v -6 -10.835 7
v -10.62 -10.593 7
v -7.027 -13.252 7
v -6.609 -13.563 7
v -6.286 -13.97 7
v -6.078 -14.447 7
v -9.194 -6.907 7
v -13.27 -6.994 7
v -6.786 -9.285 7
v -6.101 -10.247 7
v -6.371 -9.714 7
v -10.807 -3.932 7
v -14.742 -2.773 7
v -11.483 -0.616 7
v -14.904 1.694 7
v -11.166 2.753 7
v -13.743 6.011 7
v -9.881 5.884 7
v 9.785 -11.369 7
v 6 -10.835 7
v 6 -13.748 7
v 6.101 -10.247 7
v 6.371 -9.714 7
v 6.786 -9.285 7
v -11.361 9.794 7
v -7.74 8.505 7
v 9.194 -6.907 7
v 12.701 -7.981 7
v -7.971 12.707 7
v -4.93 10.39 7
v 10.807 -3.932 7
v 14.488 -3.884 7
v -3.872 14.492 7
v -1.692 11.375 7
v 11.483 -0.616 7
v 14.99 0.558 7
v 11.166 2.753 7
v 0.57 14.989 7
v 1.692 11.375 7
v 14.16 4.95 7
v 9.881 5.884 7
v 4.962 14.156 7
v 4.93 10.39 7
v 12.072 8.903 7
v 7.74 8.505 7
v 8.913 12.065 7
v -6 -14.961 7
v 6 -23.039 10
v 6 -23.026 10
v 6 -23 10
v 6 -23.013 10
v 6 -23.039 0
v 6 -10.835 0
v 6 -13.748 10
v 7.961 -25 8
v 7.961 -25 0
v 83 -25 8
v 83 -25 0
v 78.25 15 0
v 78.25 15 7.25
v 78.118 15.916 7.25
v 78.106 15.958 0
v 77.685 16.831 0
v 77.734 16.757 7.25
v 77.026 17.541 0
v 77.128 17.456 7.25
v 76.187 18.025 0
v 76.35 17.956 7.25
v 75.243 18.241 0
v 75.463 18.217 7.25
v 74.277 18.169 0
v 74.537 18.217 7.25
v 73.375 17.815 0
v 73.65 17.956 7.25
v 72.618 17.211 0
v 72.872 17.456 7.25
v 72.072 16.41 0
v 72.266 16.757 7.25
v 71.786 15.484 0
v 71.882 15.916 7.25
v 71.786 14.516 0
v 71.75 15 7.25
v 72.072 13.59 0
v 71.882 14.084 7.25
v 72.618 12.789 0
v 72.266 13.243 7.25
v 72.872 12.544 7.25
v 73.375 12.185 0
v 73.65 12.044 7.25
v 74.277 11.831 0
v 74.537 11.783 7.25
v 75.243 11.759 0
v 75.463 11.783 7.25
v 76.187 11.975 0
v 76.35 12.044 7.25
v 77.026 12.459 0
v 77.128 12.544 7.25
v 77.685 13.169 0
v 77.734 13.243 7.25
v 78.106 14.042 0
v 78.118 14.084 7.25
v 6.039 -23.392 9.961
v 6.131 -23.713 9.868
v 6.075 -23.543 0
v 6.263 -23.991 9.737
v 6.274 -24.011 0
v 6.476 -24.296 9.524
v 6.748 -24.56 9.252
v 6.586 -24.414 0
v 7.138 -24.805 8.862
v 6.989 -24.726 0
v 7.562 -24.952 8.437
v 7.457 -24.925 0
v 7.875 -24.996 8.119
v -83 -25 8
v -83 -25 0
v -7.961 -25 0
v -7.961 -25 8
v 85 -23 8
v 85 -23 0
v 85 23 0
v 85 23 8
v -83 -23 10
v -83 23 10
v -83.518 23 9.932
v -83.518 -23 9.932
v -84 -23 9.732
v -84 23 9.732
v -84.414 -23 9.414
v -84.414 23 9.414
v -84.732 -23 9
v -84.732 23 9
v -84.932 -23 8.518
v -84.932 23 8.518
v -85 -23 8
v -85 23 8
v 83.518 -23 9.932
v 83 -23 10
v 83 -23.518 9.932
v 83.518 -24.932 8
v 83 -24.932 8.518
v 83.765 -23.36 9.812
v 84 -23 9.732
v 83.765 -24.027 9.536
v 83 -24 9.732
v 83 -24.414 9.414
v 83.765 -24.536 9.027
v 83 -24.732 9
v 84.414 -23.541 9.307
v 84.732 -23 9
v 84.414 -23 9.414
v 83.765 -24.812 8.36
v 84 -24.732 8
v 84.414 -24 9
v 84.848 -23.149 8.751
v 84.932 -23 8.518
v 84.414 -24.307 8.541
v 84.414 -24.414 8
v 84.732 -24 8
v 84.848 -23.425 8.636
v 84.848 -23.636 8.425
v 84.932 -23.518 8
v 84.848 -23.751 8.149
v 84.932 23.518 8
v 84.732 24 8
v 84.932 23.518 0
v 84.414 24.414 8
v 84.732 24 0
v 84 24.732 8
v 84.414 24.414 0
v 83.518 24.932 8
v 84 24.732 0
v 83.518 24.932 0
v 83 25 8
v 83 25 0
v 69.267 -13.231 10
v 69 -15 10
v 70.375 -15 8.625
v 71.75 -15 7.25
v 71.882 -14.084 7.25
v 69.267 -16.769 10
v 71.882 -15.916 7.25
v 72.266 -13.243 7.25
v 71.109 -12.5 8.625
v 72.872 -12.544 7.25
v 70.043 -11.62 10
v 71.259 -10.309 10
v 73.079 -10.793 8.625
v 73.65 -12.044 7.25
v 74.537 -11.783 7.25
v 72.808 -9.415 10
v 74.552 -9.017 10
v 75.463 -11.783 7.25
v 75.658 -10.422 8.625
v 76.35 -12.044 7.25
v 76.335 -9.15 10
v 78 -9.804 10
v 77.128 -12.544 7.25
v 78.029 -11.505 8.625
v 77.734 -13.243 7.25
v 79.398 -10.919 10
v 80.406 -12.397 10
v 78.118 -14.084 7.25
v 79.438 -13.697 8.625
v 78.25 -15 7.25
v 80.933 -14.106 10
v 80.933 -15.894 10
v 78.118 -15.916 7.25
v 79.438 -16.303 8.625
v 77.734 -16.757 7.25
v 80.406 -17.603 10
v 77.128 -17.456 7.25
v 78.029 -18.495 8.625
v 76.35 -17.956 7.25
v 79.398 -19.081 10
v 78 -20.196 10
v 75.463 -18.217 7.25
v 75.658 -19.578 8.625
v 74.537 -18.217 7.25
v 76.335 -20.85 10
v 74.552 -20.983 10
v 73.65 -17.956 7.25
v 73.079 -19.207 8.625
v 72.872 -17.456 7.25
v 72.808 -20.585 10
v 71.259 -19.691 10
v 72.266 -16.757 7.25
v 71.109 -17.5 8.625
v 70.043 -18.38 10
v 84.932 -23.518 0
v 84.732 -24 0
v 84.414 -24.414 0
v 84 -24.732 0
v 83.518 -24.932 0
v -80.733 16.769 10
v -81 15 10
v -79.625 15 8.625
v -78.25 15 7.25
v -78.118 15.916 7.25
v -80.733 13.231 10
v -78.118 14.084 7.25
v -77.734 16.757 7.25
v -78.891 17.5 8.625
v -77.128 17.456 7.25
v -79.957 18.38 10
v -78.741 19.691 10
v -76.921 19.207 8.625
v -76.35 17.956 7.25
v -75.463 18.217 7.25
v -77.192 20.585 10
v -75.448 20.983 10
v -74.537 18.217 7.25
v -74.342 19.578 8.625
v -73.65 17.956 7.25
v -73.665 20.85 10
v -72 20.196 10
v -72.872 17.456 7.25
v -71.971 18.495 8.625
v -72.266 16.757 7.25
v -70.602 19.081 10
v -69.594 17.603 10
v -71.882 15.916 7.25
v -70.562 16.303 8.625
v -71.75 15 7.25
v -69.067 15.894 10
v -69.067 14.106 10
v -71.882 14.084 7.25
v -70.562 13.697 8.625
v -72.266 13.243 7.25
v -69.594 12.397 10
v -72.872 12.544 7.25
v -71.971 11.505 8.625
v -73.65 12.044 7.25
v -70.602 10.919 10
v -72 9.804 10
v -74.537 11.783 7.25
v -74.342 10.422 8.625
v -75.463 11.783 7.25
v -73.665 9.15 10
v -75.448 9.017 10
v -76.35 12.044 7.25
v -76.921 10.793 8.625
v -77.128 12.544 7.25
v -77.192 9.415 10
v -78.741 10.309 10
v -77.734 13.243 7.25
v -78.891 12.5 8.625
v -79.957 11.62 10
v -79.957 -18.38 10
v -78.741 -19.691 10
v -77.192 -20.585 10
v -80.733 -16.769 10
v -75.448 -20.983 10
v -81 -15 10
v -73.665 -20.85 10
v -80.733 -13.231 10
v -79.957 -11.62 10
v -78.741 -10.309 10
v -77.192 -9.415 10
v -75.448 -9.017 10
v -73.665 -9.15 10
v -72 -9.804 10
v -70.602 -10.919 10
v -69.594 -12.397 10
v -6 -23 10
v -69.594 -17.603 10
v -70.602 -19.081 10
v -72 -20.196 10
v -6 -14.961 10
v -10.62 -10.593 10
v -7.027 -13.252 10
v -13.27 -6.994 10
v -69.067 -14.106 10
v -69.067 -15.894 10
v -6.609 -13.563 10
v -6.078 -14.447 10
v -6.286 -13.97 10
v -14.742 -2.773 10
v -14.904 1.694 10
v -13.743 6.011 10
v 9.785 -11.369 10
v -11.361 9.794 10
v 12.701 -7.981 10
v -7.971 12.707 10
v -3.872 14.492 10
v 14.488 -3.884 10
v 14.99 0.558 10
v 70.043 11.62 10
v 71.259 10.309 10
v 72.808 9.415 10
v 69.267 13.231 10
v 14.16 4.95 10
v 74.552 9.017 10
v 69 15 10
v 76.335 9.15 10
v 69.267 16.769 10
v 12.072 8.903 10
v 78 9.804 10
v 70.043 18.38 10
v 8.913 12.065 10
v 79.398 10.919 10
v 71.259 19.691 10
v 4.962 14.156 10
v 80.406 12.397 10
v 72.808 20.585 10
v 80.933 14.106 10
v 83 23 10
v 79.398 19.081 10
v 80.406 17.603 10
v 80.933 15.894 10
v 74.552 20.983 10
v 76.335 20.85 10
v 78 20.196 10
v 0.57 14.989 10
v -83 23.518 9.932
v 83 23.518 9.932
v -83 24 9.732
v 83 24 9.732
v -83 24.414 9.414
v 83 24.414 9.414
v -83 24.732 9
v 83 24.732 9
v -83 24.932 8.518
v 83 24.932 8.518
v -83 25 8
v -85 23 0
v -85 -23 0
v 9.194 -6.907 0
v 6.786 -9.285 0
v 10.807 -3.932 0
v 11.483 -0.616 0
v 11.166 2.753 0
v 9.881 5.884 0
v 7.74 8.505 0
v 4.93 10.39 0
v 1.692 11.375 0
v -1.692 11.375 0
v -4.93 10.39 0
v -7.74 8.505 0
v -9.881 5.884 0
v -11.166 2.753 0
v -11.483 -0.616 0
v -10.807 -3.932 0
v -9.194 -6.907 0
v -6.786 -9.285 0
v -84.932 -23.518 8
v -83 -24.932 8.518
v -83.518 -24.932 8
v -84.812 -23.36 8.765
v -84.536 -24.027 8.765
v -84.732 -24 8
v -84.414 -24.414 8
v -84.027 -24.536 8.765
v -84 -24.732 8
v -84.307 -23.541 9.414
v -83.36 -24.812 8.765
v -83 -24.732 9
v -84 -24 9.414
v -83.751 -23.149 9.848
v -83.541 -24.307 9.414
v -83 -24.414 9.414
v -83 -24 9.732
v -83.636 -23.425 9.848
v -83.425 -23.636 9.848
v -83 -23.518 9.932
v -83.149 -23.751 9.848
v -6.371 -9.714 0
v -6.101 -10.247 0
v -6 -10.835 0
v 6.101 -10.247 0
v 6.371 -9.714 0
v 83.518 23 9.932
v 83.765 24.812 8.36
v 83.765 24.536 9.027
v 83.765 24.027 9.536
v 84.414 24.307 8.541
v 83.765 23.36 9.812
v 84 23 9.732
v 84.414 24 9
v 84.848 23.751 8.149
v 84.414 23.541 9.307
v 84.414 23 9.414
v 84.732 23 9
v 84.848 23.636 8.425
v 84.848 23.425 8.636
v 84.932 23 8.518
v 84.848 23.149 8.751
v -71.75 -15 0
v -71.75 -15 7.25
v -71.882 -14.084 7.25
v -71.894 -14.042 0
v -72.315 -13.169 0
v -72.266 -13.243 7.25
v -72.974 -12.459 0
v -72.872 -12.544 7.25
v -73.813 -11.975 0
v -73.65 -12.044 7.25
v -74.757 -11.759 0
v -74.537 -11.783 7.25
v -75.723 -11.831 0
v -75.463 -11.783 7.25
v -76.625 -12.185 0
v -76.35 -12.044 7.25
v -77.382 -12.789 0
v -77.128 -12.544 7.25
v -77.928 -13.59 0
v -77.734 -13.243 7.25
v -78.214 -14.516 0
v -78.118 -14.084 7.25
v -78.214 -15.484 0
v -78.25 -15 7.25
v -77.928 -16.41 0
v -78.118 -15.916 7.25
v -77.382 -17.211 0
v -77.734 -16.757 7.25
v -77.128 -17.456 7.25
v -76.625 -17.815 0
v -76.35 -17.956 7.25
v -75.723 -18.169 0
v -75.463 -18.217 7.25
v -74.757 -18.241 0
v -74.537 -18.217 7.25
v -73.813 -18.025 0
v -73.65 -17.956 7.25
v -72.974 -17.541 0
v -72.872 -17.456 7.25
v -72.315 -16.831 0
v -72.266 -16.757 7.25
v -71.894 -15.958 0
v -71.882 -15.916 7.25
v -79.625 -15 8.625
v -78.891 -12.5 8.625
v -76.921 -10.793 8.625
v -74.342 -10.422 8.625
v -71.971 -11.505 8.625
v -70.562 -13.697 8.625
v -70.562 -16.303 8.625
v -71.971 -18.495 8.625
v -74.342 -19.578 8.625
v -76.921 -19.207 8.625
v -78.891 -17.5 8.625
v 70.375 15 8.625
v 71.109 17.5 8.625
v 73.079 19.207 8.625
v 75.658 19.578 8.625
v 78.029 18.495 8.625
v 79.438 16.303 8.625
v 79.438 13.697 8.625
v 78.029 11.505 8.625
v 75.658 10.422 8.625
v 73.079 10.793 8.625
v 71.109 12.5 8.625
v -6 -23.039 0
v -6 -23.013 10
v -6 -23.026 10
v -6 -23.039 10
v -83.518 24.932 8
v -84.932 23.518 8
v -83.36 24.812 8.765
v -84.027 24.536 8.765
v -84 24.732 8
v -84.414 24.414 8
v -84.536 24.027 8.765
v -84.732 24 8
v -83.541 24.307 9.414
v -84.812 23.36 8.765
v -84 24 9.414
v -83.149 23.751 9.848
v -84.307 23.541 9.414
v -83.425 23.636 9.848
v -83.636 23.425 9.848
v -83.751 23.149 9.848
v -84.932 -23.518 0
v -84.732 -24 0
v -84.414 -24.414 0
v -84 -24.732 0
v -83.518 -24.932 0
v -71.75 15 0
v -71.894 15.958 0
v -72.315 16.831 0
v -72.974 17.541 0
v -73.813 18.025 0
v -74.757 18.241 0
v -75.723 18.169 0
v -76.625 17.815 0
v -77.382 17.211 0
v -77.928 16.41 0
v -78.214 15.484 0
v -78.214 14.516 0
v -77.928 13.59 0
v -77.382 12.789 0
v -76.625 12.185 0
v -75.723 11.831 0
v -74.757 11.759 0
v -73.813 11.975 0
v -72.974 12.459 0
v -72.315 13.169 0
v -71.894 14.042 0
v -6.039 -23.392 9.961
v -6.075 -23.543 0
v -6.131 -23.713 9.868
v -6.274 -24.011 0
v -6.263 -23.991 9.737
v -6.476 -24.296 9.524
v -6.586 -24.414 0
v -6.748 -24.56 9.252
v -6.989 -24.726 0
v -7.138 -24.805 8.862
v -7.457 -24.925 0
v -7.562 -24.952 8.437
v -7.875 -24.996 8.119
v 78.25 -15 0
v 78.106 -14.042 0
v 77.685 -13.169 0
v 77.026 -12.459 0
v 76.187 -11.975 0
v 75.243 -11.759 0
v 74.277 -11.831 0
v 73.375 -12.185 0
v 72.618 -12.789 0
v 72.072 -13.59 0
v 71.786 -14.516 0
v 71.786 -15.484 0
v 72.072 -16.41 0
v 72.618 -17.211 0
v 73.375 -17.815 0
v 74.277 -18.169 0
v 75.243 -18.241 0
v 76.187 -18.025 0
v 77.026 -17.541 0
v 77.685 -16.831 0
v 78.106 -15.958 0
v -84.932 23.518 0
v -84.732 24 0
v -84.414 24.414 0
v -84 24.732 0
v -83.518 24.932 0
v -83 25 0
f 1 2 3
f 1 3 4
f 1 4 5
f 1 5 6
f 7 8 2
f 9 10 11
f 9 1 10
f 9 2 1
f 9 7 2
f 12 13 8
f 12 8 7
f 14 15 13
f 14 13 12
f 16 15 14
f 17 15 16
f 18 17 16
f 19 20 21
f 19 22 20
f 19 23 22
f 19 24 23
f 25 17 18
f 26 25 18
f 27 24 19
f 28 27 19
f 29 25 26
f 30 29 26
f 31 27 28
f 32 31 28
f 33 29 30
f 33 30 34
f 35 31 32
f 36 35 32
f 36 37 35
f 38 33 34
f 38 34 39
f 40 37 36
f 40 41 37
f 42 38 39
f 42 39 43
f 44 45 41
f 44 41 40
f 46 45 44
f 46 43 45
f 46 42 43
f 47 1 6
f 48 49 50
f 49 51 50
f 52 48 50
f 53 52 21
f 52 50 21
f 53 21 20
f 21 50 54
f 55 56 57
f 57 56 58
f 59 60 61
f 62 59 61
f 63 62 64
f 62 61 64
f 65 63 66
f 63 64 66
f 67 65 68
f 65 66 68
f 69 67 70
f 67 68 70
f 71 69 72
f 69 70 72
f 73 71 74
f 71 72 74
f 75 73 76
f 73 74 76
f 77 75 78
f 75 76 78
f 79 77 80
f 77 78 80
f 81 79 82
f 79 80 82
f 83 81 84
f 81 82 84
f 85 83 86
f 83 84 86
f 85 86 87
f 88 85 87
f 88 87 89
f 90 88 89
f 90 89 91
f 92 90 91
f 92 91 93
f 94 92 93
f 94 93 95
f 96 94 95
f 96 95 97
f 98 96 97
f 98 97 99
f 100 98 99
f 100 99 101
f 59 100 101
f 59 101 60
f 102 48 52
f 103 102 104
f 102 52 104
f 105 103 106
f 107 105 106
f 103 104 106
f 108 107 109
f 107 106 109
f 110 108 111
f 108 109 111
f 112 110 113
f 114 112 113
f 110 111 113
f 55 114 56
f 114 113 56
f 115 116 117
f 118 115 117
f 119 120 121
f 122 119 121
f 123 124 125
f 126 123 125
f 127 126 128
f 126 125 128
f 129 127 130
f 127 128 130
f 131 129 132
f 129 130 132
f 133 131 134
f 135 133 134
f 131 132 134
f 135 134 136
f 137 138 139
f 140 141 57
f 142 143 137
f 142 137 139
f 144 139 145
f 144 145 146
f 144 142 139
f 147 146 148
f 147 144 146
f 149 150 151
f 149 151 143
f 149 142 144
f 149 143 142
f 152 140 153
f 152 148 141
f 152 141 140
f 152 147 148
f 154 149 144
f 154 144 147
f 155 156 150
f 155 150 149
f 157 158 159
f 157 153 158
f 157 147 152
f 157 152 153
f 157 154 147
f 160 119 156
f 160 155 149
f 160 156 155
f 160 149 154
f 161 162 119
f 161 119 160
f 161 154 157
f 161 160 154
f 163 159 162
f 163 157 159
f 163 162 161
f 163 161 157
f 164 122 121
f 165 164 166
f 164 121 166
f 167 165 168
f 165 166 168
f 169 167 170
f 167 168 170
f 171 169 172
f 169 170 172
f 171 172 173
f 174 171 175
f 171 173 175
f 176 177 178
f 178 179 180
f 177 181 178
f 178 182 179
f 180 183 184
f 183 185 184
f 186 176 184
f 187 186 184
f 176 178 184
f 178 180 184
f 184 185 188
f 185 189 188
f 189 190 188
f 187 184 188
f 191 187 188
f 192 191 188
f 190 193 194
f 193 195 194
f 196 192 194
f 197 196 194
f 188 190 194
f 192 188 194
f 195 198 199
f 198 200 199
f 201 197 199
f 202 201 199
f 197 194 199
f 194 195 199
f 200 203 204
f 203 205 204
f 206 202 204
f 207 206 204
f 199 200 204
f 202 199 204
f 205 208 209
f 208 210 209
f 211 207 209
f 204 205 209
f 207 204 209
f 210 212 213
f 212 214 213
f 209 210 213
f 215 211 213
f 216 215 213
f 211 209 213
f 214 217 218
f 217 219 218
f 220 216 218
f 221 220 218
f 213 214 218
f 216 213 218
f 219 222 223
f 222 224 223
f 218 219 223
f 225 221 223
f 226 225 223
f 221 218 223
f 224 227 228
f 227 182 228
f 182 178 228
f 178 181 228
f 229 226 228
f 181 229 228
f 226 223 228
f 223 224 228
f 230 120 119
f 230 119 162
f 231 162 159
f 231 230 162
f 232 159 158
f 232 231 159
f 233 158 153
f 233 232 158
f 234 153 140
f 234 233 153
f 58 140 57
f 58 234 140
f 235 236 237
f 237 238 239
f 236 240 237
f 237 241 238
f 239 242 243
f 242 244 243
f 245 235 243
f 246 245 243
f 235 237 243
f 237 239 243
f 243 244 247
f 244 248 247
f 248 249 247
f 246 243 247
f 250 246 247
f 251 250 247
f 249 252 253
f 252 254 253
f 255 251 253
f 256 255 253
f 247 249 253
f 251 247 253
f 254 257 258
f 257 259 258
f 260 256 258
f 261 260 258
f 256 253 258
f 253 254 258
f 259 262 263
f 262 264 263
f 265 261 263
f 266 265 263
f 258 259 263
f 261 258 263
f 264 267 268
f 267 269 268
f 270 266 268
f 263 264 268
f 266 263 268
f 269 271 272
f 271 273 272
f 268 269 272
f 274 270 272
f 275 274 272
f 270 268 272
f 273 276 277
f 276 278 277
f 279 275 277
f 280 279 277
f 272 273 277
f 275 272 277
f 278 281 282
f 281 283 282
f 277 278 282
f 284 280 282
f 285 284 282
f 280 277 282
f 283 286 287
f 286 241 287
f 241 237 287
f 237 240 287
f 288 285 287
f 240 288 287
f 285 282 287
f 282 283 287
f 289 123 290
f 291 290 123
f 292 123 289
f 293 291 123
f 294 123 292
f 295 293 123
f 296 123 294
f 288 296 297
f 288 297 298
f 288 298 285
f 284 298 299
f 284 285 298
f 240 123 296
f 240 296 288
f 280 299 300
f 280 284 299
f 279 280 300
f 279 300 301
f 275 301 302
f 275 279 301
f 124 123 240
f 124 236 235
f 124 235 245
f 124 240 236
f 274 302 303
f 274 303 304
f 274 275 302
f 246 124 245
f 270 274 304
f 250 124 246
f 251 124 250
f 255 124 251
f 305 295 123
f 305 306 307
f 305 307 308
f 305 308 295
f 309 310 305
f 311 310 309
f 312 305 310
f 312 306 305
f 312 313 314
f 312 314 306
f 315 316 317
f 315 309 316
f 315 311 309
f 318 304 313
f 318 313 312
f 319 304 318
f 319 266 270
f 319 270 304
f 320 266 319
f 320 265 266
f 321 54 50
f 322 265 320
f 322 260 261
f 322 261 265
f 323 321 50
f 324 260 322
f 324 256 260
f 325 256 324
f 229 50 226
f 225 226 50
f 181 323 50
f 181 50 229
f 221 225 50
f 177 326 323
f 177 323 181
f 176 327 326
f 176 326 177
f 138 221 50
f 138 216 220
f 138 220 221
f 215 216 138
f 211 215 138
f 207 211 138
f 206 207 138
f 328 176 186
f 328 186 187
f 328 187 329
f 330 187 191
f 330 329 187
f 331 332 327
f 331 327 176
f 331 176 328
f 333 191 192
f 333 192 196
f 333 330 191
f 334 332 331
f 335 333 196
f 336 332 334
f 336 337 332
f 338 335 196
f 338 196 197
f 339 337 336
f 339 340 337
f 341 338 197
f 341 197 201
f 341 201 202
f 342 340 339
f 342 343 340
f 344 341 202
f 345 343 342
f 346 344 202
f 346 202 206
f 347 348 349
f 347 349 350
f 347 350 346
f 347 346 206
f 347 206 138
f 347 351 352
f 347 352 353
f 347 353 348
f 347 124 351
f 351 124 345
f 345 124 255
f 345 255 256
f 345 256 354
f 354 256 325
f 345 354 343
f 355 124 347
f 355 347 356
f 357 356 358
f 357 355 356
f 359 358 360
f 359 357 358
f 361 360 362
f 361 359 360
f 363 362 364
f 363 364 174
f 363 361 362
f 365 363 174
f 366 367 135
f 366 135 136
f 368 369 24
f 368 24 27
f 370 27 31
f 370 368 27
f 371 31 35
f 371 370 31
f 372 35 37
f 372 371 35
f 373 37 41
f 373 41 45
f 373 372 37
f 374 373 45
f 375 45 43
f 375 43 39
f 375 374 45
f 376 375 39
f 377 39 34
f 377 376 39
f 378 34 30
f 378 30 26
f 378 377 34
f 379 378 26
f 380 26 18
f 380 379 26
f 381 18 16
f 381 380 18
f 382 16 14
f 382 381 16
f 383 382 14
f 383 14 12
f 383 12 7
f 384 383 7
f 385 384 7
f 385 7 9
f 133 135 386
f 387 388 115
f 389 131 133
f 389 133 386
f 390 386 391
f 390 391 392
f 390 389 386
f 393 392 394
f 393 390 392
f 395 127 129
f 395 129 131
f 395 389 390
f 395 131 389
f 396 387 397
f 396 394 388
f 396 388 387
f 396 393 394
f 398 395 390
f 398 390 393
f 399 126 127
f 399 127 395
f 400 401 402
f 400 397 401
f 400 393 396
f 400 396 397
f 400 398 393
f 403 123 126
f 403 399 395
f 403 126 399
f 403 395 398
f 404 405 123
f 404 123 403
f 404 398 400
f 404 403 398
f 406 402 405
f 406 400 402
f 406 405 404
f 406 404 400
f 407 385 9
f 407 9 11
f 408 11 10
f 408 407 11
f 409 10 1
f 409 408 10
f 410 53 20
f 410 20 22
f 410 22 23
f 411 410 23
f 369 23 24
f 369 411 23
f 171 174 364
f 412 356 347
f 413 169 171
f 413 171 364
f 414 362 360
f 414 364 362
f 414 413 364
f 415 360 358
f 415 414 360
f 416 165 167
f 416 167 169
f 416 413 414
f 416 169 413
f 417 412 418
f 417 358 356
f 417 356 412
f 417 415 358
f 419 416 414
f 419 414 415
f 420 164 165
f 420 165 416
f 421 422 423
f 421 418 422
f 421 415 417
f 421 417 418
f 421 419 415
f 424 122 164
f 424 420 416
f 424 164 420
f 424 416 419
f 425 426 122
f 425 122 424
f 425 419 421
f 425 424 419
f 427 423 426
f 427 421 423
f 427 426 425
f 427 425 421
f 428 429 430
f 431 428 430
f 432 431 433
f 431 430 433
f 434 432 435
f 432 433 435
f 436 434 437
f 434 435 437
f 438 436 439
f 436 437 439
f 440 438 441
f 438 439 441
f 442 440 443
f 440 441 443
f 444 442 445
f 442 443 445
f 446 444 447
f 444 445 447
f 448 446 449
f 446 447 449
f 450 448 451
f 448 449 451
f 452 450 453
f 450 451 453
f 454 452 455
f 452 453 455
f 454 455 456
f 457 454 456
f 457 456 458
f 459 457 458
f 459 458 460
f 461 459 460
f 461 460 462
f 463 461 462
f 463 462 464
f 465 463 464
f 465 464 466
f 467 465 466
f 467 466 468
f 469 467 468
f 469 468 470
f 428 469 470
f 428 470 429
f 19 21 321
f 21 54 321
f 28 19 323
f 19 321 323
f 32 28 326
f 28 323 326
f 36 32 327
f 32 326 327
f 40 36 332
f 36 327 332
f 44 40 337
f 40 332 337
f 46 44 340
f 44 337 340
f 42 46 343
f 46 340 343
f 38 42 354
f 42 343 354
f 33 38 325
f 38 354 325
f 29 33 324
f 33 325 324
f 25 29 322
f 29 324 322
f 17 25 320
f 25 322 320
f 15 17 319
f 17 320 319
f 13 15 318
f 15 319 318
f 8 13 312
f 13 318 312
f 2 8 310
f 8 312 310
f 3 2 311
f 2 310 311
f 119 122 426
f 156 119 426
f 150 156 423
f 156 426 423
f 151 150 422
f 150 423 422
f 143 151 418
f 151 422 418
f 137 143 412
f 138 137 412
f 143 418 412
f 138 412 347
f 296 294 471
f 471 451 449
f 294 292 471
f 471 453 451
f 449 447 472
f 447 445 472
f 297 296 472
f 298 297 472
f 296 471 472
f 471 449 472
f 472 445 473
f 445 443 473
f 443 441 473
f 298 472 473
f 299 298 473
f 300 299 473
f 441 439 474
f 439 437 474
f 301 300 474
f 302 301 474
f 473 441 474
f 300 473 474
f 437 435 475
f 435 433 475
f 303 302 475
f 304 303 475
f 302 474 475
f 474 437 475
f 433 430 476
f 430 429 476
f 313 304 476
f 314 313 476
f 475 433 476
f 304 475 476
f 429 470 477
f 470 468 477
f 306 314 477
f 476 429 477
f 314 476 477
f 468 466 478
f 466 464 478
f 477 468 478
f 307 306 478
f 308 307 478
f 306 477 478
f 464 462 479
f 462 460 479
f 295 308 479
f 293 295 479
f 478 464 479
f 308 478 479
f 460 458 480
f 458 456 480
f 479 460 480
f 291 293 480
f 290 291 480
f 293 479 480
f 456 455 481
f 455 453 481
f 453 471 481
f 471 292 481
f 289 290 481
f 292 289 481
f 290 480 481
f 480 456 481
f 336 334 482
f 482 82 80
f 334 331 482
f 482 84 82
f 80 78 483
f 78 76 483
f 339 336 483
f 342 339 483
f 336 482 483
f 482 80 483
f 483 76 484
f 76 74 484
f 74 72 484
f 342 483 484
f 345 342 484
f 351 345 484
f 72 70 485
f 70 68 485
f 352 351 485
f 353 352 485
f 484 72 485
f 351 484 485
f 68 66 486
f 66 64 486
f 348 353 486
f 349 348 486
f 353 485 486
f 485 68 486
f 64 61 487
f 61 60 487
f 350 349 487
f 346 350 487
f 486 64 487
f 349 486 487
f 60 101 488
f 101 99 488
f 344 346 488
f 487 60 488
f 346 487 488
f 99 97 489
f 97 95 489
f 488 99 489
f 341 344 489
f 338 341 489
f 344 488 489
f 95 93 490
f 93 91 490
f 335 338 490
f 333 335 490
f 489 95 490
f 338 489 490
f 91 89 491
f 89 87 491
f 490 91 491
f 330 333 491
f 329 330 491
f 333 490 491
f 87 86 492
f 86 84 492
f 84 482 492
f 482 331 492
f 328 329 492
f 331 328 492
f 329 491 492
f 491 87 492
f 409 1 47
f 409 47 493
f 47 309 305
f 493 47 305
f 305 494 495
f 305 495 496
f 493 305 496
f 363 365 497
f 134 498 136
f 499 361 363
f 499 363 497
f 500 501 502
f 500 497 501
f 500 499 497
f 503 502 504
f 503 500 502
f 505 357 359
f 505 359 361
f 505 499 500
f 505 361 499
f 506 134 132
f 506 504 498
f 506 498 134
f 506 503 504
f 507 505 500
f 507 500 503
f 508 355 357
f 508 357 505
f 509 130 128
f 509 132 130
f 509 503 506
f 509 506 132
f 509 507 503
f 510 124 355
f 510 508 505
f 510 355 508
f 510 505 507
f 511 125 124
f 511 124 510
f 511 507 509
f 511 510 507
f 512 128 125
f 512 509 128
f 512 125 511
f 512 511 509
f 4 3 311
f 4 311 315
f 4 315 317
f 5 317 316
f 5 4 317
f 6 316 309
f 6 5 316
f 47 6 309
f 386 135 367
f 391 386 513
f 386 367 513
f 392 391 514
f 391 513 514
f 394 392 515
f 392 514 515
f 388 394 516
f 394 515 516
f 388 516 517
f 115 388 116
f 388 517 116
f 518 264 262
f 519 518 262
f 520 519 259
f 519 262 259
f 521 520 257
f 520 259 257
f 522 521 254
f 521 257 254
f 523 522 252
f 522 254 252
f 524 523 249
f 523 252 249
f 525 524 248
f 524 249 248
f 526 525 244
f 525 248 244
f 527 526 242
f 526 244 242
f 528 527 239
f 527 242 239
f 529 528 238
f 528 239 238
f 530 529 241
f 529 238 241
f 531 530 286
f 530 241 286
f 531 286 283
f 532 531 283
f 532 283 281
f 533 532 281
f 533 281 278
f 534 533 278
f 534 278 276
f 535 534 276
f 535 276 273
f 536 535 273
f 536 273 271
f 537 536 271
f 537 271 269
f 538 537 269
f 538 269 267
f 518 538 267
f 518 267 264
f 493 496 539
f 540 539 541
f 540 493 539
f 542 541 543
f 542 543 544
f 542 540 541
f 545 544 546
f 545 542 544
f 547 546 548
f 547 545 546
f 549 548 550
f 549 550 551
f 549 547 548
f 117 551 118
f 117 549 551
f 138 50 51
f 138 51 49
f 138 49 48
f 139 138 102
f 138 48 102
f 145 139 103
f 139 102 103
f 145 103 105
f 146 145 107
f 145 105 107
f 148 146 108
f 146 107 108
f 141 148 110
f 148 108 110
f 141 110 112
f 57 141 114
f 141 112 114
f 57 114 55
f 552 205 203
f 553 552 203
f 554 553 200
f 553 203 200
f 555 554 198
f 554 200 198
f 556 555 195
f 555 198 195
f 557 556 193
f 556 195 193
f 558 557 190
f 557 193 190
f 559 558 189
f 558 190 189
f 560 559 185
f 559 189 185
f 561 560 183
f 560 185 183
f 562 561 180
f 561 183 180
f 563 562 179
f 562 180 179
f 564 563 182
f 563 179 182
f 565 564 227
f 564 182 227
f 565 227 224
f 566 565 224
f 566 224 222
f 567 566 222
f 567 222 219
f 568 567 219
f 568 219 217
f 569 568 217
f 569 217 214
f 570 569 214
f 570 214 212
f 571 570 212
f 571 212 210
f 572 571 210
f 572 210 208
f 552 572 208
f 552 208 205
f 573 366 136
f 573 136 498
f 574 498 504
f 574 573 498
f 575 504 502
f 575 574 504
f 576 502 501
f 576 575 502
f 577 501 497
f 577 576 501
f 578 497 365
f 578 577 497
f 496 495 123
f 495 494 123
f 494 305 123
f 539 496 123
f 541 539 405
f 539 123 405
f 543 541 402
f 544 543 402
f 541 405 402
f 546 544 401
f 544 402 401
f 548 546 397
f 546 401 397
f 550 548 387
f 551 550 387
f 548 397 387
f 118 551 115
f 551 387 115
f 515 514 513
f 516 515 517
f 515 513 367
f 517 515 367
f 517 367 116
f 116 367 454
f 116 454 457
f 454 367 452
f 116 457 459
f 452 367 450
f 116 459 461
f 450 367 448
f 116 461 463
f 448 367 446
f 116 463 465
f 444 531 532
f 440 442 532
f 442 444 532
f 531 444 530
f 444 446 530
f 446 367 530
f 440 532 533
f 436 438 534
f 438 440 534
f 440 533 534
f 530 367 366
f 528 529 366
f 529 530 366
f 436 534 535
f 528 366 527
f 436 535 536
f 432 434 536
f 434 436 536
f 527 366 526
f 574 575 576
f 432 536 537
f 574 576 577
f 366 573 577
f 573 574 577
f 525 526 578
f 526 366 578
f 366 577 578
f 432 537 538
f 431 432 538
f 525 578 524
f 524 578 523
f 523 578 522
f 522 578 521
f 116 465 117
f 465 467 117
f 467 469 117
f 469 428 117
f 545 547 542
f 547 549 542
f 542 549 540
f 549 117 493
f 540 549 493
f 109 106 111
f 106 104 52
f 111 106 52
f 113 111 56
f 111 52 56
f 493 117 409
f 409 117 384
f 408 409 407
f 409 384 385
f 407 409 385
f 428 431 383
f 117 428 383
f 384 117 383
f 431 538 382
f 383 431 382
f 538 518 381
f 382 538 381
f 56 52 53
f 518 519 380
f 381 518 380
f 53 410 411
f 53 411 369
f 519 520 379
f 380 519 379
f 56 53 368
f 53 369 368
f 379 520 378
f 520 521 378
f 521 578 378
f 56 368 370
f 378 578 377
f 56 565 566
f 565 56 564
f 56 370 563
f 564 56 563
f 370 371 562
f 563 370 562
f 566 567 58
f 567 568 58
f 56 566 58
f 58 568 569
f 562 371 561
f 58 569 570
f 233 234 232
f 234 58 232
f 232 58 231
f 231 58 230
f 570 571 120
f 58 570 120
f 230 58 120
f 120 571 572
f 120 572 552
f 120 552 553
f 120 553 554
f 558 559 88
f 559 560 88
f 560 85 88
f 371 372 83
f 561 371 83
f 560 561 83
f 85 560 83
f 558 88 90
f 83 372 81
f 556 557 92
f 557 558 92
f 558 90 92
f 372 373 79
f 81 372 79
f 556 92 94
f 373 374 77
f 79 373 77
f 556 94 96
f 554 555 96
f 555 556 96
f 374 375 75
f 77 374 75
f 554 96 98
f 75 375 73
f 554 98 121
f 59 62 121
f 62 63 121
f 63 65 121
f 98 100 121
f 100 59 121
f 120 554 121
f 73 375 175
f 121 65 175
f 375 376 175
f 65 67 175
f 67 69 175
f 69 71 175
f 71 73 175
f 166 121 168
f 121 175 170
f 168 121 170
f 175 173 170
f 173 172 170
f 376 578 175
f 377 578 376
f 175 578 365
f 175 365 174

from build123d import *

# Parameters (mm, degrees)
F0_W            = 170
F0_H            = 50
F0_R            = 11.5
F1_DEPTH        = 10
F2_R            = 3.25
F3_DEPTH        = 10.001
F4_R            = 15
F4_R_2          = 11.5
F5_DEPTH        = 3
F7_DEPTH        = 25
F8_T1_DEPTH     = 20.004828627
F8_T3_DEPTH     = 12.3229236974
F8_T5_DEPTH     = 6.1336823274
F9_T1_DEPTH     = 46
F9_T3_DEPTH     = 166
F9_T5_DEPTH     = 13
F9_T7_DEPTH     = 80.0390459698
F9_T9_DEPTH     = 80.0390459698
F9_S13_W        = 2
F9_S13_H        = 2
F9_T14_DEPTH    = 2
F9_S19_W        = 2
F9_S19_H        = 2
F9_T20_DEPTH    = 2
F9_S25_W        = 2
F9_S25_H        = 2
F9_T26_DEPTH    = 2
F9_S31_W        = 2
F9_S31_H        = 2
F9_T32_DEPTH    = 2
F11_D           = 6.5
F11_DEPTH       = 15
F11_CSINK_D     = 12
F11_CSINK_ANGLE = 90
F11_TIP         = 1.9527970118


# Not quite as in the source:
# - a fillet or chamfer that OpenCascade refuses, or shapes differently, is made with other operations: its cross-section is extruded or revolved along the edge and cut away or added


with BuildPart() as f1:
    # F0 (on Top) → F1 (new body)
    with BuildSketch(Plane.XY):
        Rectangle(F0_W, F0_H)
        Circle(F0_R, mode=Mode.SUBTRACT)
    extrude(amount=F1_DEPTH)

    # F2 (on face) → F3 (cut, through all)
    with BuildSketch(Plane.XY.offset(10)):
        with Locations((-75, 15)):
            Circle(F2_R)
        with Locations((-75, -15)):
            Circle(F2_R)
        with Locations((75, -15)):
            Circle(F2_R)
        with Locations((75, 15)):
            Circle(F2_R)
    extrude(amount=-F3_DEPTH, mode=Mode.SUBTRACT)

    # F4 (on face) → F5 (cut)
    with BuildSketch(Plane.XY.offset(10)):
        Circle(F4_R)
        Circle(F4_R_2, mode=Mode.SUBTRACT)
    extrude(amount=-F5_DEPTH, mode=Mode.SUBTRACT)

    # F6 (on face) → F7 (cut)
    with BuildSketch(Plane.XY.offset(10)):
        with BuildLine():
            Line((-6, -13.7477270849), (-6, -25))
            Line((-6, -25), (6, -25))
            Line((6, -25), (6, -13.7477270849))
            ThreePointArc((6, -13.7477270849), (0, -15), (-6, -13.7477270849))
        make_face()
        with BuildLine():
            Line((-6, -9), (-6, -13.7477270849))
            ThreePointArc((-6, -13.7477270849), (0, -15), (6, -13.7477270849))
            Line((6, -13.7477270849), (6, -9))
            Line((6, -9), (-6, -9))
        make_face()
    extrude(amount=-F7_DEPTH, mode=Mode.SUBTRACT)

    # F8: fillet of radius 2 on 5 edges, made by hand

    # F8_s2 → F8_t1 (cut)
    with BuildSketch(Plane.XY.offset(-5.0024143135)):
        with BuildLine():
            ThreePointArc((-5.9996, -22.9990343146), (-6.5857864376, -24.4142135624), (-8.0009656854, -25.0004))
            Line((-8.0009656854, -25.0004), (-8.0009656854, -25.2005365685))
            ThreePointArc((-8.0009656854, -25.2005365685), (-7.0004828427, -25.2001365685), (-6, -25.2001365685))
            Line((-6, -25.2001365685), (-5.7998634315, -25))
            ThreePointArc((-5.7998634315, -25), (-5.7998634315, -23.9995171573), (-5.7994634315, -22.9990343146))
            Line((-5.7994634315, -22.9990343146), (-5.9996, -22.9990343146))
        make_face()
        with BuildLine():
            ThreePointArc((5.9996, -22.9990343146), (6.5857864376, -24.4142135624), (8.0009656854, -25.0004))
            Line((8.0009656854, -25.0004), (8.0009656854, -25.2005365685))
            ThreePointArc((8.0009656854, -25.2005365685), (7.0004828427, -25.2001365685), (6, -25.2001365685))
            Line((6, -25.2001365685), (5.7998634315, -25))
            ThreePointArc((5.7998634315, -25), (5.7998634315, -23.9995171573), (5.7994634315, -22.9990343146))
            Line((5.7994634315, -22.9990343146), (5.9996, -22.9990343146))
        make_face()
    extrude(amount=F8_T1_DEPTH, mode=Mode.SUBTRACT)

    # F8_s4 → F8_t3 (cut)
    with BuildSketch(Plane.XY.offset(-2.6614618487)):
        with BuildLine():
            ThreePointArc((-6.8152717523, -9.2624441214), (-6.215115784, -9.9716058978), (-5.9996, -10.8752930995))
            Line((-5.9996, -10.8752930995), (-5.79936, -10.8752930995))
            ThreePointArc((-5.79936, -10.8752930995), (-5.79976, -10.3430007673), (-5.79976, -9.8107084352))
            Line((-5.79976, -9.8107084352), (-5.8955269565, -9.6398826737))
            ThreePointArc((-5.8955269565, -9.6398826737), (-6.3019268651, -9.3792480426), (-6.6965989276, -9.1011592236))
            Line((-6.6965989276, -9.1011592236), (-6.8152717523, -9.2624441214))
        make_face()
        with BuildLine():
            ThreePointArc((5.9996, -10.8752930995), (6.215115784, -9.9716058978), (6.8152717523, -9.2624441214))
            Line((6.8152717523, -9.2624441214), (6.6965989276, -9.1011592236))
            ThreePointArc((6.6965989276, -9.1011592236), (6.3019268651, -9.3792480426), (5.8955269565, -9.6398826737))
            Line((5.8955269565, -9.6398826737), (5.79976, -9.8107084352))
            ThreePointArc((5.79976, -9.8107084352), (5.79976, -10.3430007673), (5.79936, -10.8752930995))
            Line((5.79936, -10.8752930995), (5.9996, -10.8752930995))
        make_face()
    extrude(amount=F8_T3_DEPTH, mode=Mode.SUBTRACT)

    # F8_s6 → F8_t5 (cut)
    with BuildSketch(Plane.XY.offset(7)):
        with BuildLine():
            ThreePointArc((-7.0595694154, -13.2344429361), (-6.2849198093, -13.9710342475), (-5.9996, -15.001199952))
            Line((-5.9996, -15.001199952), (-5.79936, -15.001199952))
            ThreePointArc((-5.79936, -15.001199952), (-5.79976, -14.3744635184), (-5.79976, -13.7477270849))
            Line((-5.79976, -13.7477270849), (-5.919904, -13.5642040934))
            ThreePointArc((-5.919904, -13.5642040934), (-6.4476696186, -13.3214283223), (-6.9653263569, -13.0577672345))
            Line((-6.9653263569, -13.0577672345), (-7.0595694154, -13.2344429361))
        make_face()
    extrude(amount=F8_T5_DEPTH, mode=Mode.SUBTRACT)

    # F9: fillet of radius 2 on 9 edges, made by hand

    # F9_s2 → F9_t1 (cut)
    with BuildSketch(Plane.XZ.offset(-23)):
        with BuildLine():
            ThreePointArc((-83, 10), (-84.4142135624, 9.4142135624), (-85, 8))
            Line((-85, 8), (-85, 10))
            Line((-85, 10), (-83, 10))
        make_face()
        with BuildLine():
            ThreePointArc((85, 8), (84.4142135624, 9.4142135624), (83, 10))
            Line((83, 10), (85, 10))
            Line((85, 10), (85, 8))
        make_face()
    extrude(amount=F9_T1_DEPTH, mode=Mode.SUBTRACT)

    # F9_s4 → F9_t3 (cut)
    with BuildSketch(Plane.YZ.offset(-83)):
        with BuildLine():
            ThreePointArc((23, 10), (24.4142135624, 9.4142135624), (25, 8))
            Line((25, 8), (25, 10))
            Line((25, 10), (23, 10))
        make_face()
    extrude(amount=F9_T3_DEPTH, mode=Mode.SUBTRACT)

    # F9_s6 → F9_t5 (cut)
    with BuildSketch(Plane.XY.offset(-5)):
        with BuildLine():
            ThreePointArc((85, -23), (84.4142135624, -24.4142135624), (83, -25))
            Line((83, -25), (85, -25))
            Line((85, -25), (85, -23))
        make_face()
        with BuildLine():
            ThreePointArc((85, 23), (84.4142135624, 24.4142135624), (83, 25))
            Line((83, 25), (85, 25))
            Line((85, 25), (85, 23))
        make_face()
        with BuildLine():
            ThreePointArc((-85, -23), (-84.4142135624, -24.4142135624), (-83, -25))
            Line((-83, -25), (-85, -25))
            Line((-85, -25), (-85, -23))
        make_face()
        with BuildLine():
            ThreePointArc((-85, 23), (-84.4142135624, 24.4142135624), (-83, 25))
            Line((-83, 25), (-85, 25))
            Line((-85, 25), (-85, 23))
        make_face()
    extrude(amount=F9_T5_DEPTH, mode=Mode.SUBTRACT)

    # F9_s8 → F9_t7 (cut)
    with BuildSketch(Plane.YZ.offset(2.9609540302)):
        with BuildLine():
            ThreePointArc((-23, 10), (-24.4142135624, 9.4142135624), (-25, 8))
            Line((-25, 8), (-25, 10))
            Line((-25, 10), (-23, 10))
        make_face()
    extrude(amount=F9_T7_DEPTH, mode=Mode.SUBTRACT)

    # F9_s10 → F9_t9 (cut)
    with BuildSketch(Plane.YZ.offset(-83)):
        with BuildLine():
            ThreePointArc((-23, 10), (-24.4142135624, 9.4142135624), (-25, 8))
            Line((-25, 8), (-25, 10))
            Line((-25, 10), (-23, 10))
        make_face()
    extrude(amount=F9_T9_DEPTH, mode=Mode.SUBTRACT)


with BuildPart() as f9_tool12:
    # F9_s13 → F9_t14 (new body)
    with BuildSketch(Plane.XY.offset(8)):
        with Locations((-84, 24)):
            Rectangle(F9_S13_W, F9_S13_H)
    extrude(amount=F9_T14_DEPTH)

    # F9_s15 → F9_t16 (revolve, cut)
    with BuildSketch(Plane(origin=(-83, 23, 8), x_dir=(0.7071067812, -0.7071067812, 0), z_dir=(-0.7071067812, -0.7071067812, 0))):
        with BuildLine():
            ThreePointArc((0, -2), (2, 0), (0, 2))
            Line((0, 2), (0, -2))
        make_face()
    revolve(axis=Axis((-83, 23, 8), (0, 0, 1)), mode=Mode.SUBTRACT)


with BuildPart() as f1_1:
    add(f1.part)

    # F9_t11: cut F9_tool12
    add(f9_tool12.part, mode=Mode.SUBTRACT)


with BuildPart() as f9_tool18:
    # F9_s19 → F9_t20 (new body)
    with BuildSketch(Plane.XY.offset(8)):
        with Locations((-84, -24)):
            Rectangle(F9_S19_W, F9_S19_H)
    extrude(amount=F9_T20_DEPTH)

    # F9_s21 → F9_t22 (revolve, cut)
    with BuildSketch(Plane(origin=(-83, -23, 8), x_dir=(0.7071067812, 0.7071067812, 0), z_dir=(0.7071067812, -0.7071067812, 0))):
        with BuildLine():
            ThreePointArc((0, -2), (2, 0), (0, 2))
            Line((0, 2), (0, -2))
        make_face()
    revolve(axis=Axis((-83, -23, 8), (0, 0, 1)), mode=Mode.SUBTRACT)


with BuildPart() as f1_2:
    add(f1_1.part)

    # F9_t17: cut F9_tool18
    add(f9_tool18.part, mode=Mode.SUBTRACT)


with BuildPart() as f9_tool24:
    # F9_s25 → F9_t26 (new body)
    with BuildSketch(Plane.YZ.offset(83)):
        with Locations((24, 9)):
            Rectangle(F9_S25_W, F9_S25_H)
    extrude(amount=F9_T26_DEPTH)

    # F9_s27 → F9_t28 (revolve, cut)
    with BuildSketch(Plane(origin=(83, 23, 8), x_dir=(0, -0.7071067812, -0.7071067812), z_dir=(0, -0.7071067812, 0.7071067812))):
        with BuildLine():
            ThreePointArc((0, -2), (2, 0), (0, 2))
            Line((0, 2), (0, -2))
        make_face()
    revolve(axis=Axis((83, 23, 8), (1, 0, 0)), mode=Mode.SUBTRACT)


with BuildPart() as f1_3:
    add(f1_2.part)

    # F9_t23: cut F9_tool24
    add(f9_tool24.part, mode=Mode.SUBTRACT)


with BuildPart() as f9_tool30:
    # F9_s31 → F9_t32 (new body)
    with BuildSketch(Plane.YZ.offset(83)):
        with Locations((-24, 9)):
            Rectangle(F9_S31_W, F9_S31_H)
    extrude(amount=F9_T32_DEPTH)

    # F9_s33 → F9_t34 (revolve, cut)
    with BuildSketch(Plane(origin=(83, -23, 8), x_dir=(0, 0.7071067812, -0.7071067812), z_dir=(0, -0.7071067812, -0.7071067812))):
        with BuildLine():
            ThreePointArc((0, -2), (2, 0), (0, 2))
            Line((0, 2), (0, -2))
        make_face()
    revolve(axis=Axis((83, -23, 8), (1, 0, 0)), mode=Mode.SUBTRACT)


with BuildPart() as f1_4:
    add(f1_3.part)

    # F9_t29: cut F9_tool30
    add(f9_tool30.part, mode=Mode.SUBTRACT)

    # F11
    with Locations(Plane.XY.offset(10)):
        with Locations((-75, 15), (-75, -15), (75, -15), (75, 15)):
            CounterSinkHole(F11_D / 2, F11_CSINK_D / 2, depth=F11_DEPTH, counter_sink_angle=F11_CSINK_ANGLE)
            with Locations((0, 0, -(F11_DEPTH + F11_TIP / 2))):  # 118° drill point
                Cone(0, F11_D / 2, F11_TIP, mode=Mode.SUBTRACT)


solid = f1_4.part
